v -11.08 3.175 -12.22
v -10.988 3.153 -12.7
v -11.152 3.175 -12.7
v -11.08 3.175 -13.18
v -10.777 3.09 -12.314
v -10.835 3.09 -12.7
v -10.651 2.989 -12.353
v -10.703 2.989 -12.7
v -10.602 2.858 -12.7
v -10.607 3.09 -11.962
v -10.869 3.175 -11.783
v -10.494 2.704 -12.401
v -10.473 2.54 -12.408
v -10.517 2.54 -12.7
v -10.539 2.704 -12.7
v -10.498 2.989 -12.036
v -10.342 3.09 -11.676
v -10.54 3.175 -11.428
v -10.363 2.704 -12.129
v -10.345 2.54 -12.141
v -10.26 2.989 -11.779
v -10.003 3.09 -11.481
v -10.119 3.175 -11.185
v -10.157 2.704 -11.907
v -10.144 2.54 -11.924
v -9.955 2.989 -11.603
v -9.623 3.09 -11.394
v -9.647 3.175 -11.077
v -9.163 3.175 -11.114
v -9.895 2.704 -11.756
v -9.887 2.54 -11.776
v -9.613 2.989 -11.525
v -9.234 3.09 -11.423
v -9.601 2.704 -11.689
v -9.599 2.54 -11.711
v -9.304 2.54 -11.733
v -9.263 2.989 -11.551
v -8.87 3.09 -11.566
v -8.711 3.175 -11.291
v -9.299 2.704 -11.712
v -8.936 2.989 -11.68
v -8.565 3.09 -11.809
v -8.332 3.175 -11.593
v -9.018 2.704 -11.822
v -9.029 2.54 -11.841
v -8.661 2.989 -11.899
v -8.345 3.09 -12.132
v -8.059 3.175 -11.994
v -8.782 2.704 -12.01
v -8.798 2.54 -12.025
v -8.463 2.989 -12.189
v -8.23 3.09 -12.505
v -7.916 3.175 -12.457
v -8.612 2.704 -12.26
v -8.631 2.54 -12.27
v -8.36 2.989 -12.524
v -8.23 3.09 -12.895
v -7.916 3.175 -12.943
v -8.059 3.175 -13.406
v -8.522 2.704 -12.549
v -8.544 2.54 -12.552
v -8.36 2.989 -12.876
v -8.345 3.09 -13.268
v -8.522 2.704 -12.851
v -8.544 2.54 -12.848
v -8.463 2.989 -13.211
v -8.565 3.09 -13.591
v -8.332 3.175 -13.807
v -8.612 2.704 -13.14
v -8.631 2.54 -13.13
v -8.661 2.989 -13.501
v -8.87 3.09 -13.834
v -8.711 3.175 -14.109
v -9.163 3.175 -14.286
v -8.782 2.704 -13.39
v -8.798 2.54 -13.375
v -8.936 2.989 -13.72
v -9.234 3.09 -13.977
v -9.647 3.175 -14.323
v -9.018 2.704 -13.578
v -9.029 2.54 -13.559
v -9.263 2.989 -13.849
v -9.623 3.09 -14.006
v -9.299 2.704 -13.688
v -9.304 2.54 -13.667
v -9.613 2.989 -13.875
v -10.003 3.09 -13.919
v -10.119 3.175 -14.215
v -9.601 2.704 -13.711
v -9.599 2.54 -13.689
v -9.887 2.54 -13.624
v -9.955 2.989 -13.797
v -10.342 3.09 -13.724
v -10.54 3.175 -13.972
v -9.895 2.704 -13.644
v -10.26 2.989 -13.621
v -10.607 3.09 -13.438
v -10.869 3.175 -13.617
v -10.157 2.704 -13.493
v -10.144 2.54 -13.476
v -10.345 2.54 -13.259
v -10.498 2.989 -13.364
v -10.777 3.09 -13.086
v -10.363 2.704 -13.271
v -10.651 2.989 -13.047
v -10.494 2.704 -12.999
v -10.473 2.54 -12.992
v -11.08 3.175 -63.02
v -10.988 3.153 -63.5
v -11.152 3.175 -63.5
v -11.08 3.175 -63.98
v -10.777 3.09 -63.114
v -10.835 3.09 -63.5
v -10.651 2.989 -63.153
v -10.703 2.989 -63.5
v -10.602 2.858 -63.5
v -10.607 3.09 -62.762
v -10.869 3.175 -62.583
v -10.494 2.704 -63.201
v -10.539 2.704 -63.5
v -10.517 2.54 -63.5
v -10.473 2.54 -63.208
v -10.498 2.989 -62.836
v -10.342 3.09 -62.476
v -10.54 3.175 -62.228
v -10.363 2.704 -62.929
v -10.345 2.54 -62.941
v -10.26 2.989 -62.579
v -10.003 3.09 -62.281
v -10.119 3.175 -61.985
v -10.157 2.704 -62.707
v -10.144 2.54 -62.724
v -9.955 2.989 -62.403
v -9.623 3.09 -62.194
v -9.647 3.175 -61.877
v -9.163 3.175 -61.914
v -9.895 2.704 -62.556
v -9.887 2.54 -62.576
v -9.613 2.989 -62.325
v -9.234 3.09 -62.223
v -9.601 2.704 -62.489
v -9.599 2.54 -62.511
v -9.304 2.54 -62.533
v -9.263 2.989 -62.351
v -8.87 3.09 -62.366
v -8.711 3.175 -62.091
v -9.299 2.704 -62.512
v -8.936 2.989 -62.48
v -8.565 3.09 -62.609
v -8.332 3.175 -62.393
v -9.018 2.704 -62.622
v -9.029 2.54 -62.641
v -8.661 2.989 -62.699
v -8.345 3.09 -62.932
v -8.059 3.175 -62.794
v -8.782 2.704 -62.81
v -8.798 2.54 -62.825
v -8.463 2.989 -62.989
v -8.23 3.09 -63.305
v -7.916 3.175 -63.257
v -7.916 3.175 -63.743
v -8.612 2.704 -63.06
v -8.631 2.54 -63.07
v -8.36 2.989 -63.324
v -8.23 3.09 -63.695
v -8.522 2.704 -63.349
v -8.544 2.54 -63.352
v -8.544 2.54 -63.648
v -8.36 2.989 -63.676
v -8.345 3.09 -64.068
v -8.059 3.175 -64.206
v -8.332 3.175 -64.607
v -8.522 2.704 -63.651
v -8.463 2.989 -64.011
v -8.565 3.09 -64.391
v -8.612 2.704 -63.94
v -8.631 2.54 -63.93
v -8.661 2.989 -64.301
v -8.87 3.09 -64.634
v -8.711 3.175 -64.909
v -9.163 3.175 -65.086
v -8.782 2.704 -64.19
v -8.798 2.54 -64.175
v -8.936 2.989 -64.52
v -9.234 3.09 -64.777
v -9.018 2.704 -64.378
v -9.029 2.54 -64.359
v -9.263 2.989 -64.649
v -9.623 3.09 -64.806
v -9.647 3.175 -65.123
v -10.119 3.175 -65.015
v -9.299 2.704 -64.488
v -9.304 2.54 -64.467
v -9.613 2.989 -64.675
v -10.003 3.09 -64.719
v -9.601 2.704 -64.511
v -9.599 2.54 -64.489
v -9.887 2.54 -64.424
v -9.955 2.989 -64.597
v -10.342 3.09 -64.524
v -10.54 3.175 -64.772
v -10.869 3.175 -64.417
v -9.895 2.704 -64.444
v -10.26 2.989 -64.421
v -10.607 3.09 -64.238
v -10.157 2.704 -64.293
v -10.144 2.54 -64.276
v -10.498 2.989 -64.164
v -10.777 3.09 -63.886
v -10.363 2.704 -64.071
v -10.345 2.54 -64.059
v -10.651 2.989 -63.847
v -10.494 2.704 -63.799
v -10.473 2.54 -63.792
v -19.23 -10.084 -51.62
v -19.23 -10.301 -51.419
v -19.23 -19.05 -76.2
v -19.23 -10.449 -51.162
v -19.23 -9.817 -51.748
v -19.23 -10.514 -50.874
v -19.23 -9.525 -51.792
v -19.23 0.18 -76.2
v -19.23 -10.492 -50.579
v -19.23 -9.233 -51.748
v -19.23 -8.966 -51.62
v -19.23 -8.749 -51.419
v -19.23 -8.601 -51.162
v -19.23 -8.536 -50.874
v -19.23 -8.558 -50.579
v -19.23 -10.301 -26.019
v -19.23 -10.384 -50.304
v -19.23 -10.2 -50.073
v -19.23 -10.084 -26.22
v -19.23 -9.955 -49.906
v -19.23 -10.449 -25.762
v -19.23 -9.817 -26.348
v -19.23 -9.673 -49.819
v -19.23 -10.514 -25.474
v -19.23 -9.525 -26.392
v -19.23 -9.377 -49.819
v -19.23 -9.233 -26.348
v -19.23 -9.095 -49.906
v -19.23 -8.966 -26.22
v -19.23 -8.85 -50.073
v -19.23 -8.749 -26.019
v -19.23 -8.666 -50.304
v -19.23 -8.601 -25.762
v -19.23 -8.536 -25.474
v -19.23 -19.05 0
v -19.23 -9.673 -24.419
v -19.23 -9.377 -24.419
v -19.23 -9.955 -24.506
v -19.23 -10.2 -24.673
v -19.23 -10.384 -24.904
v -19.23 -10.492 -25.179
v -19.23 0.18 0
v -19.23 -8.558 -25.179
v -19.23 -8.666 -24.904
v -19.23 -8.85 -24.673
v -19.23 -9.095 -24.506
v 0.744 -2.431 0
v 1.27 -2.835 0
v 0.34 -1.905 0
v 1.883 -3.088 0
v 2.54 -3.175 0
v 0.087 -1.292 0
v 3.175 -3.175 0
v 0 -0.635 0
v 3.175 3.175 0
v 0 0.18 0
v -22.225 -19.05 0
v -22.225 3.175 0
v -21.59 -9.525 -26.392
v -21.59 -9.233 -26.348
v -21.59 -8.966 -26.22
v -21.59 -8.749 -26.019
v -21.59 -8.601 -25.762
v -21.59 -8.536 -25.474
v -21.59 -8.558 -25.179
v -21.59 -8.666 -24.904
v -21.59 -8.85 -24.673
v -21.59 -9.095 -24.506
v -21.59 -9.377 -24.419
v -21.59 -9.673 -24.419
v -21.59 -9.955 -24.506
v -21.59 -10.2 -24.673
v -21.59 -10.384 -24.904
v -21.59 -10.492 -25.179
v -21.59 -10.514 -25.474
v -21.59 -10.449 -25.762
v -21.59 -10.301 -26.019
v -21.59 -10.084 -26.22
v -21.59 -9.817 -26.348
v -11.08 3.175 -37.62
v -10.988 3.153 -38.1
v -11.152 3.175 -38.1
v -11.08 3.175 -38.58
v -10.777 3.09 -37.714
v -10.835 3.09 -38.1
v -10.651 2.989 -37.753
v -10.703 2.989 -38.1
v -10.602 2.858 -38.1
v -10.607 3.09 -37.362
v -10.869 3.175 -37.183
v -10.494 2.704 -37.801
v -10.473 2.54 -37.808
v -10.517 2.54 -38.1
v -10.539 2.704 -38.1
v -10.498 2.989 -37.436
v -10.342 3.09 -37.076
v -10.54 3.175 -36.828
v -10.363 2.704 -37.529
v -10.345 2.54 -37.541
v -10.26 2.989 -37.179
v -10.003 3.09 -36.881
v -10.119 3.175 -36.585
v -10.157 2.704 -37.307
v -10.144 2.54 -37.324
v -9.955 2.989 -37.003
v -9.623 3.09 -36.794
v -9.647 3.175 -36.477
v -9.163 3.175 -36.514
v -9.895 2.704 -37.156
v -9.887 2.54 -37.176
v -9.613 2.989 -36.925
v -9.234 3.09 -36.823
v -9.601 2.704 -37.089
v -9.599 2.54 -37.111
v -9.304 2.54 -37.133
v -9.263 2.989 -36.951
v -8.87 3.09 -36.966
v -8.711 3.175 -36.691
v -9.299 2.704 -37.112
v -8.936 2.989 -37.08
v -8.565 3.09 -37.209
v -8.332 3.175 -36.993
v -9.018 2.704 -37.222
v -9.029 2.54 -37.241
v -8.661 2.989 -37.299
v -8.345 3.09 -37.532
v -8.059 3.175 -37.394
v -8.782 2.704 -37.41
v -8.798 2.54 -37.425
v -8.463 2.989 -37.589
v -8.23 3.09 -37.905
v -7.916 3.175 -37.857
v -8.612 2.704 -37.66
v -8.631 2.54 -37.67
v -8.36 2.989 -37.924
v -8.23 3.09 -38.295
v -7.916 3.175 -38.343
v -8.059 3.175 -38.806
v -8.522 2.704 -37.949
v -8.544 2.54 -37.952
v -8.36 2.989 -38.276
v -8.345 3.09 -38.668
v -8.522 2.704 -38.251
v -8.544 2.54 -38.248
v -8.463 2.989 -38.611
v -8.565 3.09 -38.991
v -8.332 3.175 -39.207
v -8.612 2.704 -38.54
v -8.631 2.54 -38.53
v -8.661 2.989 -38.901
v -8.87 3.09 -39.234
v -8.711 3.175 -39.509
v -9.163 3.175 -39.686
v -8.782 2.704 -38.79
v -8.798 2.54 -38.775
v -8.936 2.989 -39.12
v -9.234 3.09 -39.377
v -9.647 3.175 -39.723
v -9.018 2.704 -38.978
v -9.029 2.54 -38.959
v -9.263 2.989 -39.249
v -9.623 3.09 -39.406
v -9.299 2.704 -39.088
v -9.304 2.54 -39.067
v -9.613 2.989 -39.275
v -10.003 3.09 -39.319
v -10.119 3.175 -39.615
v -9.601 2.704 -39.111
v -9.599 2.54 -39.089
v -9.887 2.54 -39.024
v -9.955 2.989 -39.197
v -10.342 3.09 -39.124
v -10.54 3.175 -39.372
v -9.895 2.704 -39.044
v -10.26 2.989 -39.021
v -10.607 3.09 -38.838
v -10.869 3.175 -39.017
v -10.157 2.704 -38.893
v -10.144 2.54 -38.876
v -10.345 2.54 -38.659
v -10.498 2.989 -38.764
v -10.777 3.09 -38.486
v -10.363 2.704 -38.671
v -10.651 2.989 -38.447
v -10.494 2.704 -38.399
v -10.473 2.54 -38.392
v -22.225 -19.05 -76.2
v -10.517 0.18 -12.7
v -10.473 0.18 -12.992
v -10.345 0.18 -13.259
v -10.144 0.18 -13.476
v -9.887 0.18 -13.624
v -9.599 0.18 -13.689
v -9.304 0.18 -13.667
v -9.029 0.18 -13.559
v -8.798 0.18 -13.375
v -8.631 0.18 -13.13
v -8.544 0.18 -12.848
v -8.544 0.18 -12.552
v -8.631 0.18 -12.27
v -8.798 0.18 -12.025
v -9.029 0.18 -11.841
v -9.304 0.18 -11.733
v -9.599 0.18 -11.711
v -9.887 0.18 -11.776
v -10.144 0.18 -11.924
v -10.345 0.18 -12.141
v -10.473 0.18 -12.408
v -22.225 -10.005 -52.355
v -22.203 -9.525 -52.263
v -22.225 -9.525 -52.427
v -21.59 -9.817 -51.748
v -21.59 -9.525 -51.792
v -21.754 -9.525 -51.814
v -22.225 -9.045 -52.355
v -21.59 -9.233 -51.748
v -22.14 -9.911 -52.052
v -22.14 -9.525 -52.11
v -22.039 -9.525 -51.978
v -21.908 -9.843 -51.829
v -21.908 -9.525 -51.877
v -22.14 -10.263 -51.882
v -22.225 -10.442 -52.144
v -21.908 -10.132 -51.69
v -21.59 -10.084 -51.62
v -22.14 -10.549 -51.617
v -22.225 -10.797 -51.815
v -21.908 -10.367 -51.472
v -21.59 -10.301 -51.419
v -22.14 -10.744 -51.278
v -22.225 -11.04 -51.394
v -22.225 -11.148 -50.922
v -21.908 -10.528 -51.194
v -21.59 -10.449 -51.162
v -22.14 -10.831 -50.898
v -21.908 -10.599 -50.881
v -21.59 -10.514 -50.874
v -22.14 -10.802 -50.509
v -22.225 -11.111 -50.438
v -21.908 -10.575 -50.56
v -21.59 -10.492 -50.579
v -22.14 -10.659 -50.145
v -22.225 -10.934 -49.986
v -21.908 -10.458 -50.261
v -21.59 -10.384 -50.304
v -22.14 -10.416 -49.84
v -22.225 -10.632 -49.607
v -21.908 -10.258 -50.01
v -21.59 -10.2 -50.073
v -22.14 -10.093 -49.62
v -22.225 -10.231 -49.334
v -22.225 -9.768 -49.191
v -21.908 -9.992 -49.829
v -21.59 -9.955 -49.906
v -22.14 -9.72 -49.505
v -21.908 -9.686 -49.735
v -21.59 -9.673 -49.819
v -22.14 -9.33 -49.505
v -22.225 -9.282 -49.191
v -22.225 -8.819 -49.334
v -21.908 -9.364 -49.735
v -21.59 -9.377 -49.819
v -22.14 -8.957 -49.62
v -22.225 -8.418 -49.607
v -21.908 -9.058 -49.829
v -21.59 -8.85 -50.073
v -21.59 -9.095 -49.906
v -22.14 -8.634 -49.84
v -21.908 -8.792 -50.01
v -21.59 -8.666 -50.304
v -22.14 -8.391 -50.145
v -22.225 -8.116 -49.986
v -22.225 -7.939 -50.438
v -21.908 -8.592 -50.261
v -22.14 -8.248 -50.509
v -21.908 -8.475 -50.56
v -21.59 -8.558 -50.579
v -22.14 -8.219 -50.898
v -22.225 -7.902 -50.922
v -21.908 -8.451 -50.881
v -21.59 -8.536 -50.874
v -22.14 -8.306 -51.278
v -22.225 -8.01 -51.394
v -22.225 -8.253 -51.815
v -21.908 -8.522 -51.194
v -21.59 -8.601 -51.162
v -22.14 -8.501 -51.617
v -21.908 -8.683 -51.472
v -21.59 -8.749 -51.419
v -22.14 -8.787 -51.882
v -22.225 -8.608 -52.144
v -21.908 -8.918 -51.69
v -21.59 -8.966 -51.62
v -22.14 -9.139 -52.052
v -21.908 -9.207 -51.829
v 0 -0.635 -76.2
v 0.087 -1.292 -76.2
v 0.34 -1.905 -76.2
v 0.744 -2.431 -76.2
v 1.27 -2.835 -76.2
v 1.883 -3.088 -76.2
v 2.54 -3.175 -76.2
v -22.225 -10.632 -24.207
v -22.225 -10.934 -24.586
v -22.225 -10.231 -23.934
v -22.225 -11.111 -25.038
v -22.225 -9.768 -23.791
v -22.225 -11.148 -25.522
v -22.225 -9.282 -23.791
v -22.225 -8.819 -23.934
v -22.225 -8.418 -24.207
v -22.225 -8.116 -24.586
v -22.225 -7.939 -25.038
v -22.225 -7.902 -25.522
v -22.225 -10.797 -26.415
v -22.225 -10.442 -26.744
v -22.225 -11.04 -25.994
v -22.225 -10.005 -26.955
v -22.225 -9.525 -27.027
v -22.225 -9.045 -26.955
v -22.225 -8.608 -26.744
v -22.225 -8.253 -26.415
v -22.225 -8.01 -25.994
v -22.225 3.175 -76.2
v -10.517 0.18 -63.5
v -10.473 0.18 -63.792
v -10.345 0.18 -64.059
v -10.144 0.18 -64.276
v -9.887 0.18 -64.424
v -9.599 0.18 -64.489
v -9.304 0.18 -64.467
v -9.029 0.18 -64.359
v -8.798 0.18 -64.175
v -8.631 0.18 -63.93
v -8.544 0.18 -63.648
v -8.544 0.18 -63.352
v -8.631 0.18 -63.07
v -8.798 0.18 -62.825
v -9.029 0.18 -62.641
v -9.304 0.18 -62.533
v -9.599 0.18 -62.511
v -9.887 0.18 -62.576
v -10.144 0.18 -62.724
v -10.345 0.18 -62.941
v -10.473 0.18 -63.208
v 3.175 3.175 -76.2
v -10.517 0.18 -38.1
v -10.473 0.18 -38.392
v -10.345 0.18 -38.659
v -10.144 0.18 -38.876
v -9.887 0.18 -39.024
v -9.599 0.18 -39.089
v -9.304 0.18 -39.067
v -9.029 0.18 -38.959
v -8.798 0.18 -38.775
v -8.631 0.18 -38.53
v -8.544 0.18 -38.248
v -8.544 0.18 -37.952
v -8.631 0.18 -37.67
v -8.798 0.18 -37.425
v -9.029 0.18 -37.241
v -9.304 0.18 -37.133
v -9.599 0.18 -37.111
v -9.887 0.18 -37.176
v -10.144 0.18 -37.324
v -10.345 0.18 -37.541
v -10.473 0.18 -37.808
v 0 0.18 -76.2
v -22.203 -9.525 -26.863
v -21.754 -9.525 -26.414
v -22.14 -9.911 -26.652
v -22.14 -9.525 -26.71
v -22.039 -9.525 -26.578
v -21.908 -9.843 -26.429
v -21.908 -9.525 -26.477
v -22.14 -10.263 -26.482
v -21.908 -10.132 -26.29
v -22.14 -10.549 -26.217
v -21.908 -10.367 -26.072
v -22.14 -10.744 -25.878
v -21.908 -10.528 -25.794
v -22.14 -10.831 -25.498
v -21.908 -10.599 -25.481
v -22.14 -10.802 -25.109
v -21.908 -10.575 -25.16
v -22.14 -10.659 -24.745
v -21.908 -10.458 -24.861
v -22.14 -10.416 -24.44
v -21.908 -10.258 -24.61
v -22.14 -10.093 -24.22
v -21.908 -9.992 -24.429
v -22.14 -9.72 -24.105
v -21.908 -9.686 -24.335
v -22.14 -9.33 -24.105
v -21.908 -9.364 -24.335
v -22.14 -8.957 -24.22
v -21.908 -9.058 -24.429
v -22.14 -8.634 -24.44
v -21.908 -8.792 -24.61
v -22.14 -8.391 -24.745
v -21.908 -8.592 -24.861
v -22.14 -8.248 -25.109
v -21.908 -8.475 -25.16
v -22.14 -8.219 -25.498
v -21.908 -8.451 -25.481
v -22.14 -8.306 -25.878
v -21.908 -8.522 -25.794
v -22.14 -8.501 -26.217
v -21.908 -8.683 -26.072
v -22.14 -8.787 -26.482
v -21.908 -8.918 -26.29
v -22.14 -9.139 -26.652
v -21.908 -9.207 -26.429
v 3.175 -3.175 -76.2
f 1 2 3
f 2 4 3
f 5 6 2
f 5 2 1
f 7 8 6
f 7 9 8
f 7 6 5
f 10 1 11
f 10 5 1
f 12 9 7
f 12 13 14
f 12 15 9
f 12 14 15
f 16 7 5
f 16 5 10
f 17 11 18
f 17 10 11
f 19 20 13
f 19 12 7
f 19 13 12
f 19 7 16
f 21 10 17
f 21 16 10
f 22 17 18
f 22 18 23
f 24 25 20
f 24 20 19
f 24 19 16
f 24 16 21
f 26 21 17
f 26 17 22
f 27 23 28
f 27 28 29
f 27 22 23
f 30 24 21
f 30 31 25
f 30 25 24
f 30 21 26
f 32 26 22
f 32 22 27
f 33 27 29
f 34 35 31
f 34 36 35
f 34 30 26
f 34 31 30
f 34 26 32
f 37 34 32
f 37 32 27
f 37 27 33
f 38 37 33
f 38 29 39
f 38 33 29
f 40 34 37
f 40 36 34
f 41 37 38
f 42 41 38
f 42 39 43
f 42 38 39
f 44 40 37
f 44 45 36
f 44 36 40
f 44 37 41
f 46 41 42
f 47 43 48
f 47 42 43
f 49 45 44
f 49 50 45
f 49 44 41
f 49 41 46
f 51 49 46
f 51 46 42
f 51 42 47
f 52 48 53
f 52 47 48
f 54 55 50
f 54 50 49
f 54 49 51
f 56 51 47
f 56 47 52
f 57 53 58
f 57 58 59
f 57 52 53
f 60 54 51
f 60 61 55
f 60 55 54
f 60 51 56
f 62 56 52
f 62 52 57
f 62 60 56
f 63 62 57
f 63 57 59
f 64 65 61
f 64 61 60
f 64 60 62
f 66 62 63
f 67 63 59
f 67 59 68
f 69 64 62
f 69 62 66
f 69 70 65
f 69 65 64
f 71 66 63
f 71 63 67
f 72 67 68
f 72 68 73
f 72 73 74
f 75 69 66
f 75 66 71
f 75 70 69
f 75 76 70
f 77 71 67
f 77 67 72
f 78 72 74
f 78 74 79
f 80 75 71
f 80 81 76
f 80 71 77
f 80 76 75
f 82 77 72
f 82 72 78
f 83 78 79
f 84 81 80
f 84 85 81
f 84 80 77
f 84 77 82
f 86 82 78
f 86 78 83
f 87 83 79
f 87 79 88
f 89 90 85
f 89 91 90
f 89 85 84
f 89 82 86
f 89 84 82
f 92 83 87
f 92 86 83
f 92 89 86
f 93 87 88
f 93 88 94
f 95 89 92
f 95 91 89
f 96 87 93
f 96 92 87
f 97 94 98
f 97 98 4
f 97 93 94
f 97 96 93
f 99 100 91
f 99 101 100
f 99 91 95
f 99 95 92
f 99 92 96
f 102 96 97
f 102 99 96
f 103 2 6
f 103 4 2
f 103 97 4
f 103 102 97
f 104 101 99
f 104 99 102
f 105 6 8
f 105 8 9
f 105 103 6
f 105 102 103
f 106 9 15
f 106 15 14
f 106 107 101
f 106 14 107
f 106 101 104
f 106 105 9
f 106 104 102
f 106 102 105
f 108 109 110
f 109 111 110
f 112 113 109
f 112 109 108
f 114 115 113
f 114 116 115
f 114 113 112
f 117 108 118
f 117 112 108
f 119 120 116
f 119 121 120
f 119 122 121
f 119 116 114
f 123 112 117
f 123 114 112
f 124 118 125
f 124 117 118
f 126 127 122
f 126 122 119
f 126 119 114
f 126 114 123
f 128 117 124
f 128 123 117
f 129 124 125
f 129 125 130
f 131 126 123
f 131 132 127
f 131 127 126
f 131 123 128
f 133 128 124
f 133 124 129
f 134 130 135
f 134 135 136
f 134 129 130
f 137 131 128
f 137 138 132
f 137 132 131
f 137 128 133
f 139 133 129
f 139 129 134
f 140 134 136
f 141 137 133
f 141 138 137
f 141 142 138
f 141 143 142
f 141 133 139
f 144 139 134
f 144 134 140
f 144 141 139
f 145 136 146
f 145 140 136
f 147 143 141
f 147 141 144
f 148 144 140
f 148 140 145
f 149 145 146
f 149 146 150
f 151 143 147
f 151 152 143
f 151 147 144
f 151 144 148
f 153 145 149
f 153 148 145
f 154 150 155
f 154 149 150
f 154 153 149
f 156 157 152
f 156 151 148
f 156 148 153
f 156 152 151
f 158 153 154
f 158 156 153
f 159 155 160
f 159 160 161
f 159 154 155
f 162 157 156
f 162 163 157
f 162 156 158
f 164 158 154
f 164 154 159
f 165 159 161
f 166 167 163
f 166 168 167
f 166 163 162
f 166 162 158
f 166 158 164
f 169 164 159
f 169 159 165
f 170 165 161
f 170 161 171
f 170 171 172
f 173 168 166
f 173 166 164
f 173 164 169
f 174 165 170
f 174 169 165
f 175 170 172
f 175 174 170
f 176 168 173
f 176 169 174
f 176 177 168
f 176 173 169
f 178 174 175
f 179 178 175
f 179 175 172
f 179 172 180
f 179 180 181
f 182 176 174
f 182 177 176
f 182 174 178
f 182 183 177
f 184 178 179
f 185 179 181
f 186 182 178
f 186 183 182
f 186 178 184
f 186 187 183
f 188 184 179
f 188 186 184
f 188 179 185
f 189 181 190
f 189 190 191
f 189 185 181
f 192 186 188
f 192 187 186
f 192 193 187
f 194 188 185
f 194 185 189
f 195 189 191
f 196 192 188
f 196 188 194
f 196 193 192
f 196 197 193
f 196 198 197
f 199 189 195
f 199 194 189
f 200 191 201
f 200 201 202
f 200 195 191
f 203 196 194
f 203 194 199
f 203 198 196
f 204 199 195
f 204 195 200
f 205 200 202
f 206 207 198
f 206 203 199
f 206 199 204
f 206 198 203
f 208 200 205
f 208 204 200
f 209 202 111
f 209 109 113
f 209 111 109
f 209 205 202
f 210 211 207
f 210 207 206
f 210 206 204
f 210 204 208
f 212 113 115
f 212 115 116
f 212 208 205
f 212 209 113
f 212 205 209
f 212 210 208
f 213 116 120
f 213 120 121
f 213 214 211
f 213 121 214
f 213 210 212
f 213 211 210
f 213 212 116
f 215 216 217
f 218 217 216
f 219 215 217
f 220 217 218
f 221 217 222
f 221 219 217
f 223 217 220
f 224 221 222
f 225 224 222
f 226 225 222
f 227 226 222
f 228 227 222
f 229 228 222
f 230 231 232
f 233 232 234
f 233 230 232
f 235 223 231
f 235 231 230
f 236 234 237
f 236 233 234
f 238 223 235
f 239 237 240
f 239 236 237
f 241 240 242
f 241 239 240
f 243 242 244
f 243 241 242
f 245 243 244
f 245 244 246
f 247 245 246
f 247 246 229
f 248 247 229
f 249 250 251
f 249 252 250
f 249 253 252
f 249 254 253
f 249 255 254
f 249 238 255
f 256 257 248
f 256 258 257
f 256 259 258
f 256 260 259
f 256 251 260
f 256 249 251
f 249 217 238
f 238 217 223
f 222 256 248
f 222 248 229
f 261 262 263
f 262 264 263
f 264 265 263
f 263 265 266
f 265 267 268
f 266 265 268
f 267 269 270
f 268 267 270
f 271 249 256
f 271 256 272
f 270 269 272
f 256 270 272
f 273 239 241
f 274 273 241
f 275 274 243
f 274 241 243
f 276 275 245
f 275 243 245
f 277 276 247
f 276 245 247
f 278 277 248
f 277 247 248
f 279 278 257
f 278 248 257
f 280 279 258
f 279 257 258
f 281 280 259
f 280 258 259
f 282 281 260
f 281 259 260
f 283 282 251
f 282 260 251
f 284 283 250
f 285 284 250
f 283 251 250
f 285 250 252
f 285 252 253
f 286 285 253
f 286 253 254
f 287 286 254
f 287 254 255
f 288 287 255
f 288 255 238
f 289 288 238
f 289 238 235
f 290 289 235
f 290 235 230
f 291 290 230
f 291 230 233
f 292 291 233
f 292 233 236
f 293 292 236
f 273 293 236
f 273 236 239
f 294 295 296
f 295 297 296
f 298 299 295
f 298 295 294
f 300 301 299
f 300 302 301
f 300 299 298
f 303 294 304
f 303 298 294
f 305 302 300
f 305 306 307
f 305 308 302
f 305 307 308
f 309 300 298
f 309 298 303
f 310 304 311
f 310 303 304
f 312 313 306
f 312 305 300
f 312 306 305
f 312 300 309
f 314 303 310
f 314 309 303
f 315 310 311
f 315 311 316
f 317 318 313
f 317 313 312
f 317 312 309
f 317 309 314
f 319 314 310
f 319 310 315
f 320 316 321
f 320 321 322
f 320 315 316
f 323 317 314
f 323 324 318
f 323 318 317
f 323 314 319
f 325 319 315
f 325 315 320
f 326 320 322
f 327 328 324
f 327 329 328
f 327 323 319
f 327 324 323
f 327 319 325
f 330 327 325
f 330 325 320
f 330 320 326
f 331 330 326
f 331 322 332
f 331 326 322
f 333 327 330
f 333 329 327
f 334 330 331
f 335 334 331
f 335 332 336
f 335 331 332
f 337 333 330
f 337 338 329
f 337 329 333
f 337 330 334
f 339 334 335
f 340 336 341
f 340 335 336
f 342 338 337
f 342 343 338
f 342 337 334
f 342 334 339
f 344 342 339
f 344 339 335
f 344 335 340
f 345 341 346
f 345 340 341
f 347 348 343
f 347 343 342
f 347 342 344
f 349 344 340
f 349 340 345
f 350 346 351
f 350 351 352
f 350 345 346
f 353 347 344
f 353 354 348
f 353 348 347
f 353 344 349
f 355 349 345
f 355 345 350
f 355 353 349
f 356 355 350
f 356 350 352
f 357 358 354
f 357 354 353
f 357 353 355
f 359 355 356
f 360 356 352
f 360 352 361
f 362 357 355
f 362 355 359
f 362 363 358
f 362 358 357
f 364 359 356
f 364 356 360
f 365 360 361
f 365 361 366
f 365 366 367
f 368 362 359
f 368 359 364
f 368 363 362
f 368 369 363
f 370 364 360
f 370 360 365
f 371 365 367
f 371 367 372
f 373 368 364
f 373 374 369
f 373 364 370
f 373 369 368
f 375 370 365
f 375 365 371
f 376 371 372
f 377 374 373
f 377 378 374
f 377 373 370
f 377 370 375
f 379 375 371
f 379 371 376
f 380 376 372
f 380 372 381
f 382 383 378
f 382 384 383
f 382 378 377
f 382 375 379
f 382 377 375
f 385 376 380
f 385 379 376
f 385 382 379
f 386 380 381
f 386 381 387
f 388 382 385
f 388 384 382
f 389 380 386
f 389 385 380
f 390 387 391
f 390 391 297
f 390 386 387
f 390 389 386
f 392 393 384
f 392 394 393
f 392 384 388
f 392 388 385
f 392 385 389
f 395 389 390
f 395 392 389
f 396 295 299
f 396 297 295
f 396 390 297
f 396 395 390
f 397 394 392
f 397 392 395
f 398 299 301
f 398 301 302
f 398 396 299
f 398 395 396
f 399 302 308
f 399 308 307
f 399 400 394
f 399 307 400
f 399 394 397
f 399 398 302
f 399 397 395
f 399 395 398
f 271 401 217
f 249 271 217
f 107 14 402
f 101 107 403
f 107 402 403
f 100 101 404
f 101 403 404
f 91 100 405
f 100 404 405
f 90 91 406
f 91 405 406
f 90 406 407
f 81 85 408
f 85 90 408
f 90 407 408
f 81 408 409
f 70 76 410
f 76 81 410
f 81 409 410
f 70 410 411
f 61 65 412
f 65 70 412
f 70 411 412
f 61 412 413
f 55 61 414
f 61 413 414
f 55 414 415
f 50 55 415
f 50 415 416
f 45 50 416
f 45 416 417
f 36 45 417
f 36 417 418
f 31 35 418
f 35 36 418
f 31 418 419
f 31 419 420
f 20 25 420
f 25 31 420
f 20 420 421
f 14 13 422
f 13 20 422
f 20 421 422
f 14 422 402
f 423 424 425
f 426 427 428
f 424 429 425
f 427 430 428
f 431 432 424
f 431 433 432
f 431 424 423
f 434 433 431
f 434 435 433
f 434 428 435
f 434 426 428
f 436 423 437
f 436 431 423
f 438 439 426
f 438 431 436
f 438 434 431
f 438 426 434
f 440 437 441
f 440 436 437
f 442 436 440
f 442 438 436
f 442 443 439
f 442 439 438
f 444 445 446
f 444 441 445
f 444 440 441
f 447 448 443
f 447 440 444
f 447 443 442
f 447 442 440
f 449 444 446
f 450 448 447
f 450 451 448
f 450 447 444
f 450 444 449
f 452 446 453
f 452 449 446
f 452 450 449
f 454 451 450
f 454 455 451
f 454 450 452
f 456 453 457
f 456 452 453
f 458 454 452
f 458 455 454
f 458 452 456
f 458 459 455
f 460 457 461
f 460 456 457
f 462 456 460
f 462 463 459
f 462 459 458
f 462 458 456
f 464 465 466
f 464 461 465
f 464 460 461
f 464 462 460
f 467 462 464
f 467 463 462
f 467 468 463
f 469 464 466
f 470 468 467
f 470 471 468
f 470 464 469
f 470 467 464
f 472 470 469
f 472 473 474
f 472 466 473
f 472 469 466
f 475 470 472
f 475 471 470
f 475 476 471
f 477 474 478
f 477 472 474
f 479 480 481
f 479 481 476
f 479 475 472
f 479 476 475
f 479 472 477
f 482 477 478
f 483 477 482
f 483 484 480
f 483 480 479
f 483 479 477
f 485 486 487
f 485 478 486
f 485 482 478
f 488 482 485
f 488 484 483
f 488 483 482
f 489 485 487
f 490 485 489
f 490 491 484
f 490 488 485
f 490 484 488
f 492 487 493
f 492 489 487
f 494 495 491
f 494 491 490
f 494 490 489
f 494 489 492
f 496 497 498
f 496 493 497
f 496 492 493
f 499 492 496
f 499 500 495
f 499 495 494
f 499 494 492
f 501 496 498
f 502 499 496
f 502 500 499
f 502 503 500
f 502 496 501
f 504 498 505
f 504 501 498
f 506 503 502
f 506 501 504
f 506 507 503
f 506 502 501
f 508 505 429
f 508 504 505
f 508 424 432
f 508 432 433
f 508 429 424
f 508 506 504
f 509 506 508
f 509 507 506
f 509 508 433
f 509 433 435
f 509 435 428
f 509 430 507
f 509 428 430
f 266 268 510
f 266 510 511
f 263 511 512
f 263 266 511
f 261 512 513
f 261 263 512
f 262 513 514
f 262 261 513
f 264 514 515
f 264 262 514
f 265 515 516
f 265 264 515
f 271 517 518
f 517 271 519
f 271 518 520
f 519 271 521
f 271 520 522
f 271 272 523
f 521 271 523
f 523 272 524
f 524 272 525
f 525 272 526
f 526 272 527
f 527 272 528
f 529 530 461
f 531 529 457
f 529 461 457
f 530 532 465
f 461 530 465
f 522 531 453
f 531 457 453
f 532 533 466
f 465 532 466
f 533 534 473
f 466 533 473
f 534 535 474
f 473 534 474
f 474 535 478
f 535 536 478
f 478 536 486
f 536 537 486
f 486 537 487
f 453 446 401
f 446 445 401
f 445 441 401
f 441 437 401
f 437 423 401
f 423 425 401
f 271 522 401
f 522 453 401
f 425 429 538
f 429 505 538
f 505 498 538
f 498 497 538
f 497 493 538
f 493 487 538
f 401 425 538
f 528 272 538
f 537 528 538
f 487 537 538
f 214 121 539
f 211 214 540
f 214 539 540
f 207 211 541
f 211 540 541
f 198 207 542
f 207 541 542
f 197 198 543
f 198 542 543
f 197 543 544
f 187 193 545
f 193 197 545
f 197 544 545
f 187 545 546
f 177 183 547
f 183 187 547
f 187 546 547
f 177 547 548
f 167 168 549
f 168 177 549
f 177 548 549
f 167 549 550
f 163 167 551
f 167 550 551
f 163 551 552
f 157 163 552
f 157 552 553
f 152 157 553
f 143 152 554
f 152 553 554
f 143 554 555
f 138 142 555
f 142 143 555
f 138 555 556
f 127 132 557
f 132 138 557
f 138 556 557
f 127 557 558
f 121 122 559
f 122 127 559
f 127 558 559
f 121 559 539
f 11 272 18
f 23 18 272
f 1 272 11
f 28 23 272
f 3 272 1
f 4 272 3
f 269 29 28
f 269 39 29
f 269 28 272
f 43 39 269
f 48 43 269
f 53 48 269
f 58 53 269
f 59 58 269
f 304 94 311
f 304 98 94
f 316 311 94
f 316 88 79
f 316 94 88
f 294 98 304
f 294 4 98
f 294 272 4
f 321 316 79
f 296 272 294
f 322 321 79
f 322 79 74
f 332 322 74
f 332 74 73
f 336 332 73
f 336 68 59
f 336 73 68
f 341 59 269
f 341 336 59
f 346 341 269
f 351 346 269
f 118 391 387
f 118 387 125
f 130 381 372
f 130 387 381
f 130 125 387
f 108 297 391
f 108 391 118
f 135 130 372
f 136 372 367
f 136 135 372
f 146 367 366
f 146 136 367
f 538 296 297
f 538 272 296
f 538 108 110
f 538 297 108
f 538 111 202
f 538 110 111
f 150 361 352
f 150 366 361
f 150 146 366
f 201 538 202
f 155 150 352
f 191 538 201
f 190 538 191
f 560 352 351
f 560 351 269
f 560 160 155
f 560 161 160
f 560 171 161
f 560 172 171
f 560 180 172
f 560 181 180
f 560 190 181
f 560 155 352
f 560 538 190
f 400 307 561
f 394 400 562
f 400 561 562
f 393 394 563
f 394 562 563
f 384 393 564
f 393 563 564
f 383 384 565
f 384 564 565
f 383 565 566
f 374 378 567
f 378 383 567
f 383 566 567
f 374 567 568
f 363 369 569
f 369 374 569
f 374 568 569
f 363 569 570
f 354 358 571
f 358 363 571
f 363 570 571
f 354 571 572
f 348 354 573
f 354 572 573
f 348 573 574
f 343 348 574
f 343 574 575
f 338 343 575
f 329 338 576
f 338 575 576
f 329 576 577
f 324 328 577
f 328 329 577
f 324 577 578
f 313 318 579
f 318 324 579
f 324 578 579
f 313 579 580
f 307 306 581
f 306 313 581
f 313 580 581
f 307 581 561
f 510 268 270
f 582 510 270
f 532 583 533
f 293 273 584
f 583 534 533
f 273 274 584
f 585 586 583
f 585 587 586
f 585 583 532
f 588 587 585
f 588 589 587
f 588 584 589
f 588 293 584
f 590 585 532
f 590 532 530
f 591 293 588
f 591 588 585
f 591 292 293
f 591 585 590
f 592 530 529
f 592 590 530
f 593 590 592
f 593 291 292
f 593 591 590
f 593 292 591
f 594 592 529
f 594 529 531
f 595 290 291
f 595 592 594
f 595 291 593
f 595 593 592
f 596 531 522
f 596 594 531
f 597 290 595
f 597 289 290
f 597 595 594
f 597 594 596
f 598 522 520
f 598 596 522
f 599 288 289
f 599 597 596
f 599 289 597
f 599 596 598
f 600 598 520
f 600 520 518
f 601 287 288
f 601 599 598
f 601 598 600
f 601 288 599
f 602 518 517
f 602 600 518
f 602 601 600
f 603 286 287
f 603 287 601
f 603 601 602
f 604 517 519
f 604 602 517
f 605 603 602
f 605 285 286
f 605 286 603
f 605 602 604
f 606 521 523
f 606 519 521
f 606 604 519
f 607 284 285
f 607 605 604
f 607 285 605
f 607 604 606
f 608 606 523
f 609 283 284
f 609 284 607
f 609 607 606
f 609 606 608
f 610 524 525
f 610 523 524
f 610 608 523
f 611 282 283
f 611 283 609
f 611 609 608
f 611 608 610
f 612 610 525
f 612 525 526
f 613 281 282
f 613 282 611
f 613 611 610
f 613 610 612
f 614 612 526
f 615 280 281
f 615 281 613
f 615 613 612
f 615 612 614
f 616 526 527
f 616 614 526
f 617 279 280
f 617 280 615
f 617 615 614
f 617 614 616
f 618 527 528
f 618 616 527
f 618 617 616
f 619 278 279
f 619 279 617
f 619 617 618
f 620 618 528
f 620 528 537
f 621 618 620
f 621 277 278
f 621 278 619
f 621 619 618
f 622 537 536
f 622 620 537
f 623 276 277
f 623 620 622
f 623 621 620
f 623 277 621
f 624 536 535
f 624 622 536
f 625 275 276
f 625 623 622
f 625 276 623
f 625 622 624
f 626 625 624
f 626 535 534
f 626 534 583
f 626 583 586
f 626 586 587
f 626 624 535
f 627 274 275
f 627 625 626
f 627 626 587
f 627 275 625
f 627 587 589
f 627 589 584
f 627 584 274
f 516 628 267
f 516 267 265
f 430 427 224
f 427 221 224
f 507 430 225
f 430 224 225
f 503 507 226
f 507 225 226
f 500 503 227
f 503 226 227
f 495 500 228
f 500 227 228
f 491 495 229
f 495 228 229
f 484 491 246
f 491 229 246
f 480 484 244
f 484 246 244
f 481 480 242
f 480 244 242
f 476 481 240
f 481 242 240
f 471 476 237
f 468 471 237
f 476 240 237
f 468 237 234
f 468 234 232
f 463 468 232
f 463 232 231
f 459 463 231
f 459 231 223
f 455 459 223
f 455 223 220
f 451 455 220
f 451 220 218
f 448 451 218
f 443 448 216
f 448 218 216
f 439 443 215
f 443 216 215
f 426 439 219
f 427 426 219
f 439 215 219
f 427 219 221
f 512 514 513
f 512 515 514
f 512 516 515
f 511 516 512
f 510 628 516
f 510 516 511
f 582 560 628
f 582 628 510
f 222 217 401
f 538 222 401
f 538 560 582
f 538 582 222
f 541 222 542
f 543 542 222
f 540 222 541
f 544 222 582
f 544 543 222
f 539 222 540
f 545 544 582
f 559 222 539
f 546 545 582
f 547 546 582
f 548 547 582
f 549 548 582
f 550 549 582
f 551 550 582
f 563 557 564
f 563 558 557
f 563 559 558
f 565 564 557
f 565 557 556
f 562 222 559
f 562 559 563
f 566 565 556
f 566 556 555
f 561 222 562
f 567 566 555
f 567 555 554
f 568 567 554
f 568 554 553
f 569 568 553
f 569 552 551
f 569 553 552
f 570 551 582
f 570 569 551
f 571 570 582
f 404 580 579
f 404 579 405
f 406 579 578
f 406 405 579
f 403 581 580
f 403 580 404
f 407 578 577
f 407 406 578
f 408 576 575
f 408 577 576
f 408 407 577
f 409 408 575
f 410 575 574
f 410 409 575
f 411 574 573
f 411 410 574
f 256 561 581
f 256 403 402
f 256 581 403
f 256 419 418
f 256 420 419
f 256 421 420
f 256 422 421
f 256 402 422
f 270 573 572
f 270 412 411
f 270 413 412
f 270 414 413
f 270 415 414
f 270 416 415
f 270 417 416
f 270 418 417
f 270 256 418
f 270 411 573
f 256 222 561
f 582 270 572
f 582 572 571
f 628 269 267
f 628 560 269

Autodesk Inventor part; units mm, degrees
ref_plane "YZ Plane" through (0, 0, 0) normal (1, 0, 0) x (0, 1, 0)
ref_plane "XZ Plane" through (0, 0, 0) normal (0, 1, 0) x (-1, 0, 0)
ref_plane "XY Plane" through (0, 0, 0) normal (0, 0, 1) x (1, 0, 0)
sketch "Sketch9" plane through (0, 0, 0) normal (0, 1, 0) x (-1, 0, 0)
  line L0 (0, 0) -> (19.05, 0)
  line L1 (19.05, 0) -> (19.05, -76.2)
  line L2 (19.05, -76.2) -> (0, -76.2)
  line L3 (0, -76.2) -> (0, 0)
  circle A0 centre (9.525, -38.1) radius 0.9922
  circle A1 centre (9.525, -12.7) radius 0.9922
  circle A2 centre (9.525, -63.5) radius 0.9922
  dimension "d41" = 76.2
  dimension "d42" = 19.05
  dimension "d43" = 1.9844
  dimension "d44" = 9.525
  dimension "d45" = 38.1
  dimension "d46" = 1.9844
  dimension "d47" = 1.9844
  dimension "d48" = 9.525
  dimension "d49" = 9.525
  dimension "d50" = 25.4
  dimension "d51" = 25.4
extrude "Extrusion7" add sketch "Sketch9" along normal blind 3.175
sketch "Sketch10" plane through (0, 3.175, 0) normal (0, 1, 0) x (1, 0, 0)
  line L0 (-19.05, 76.2) -> (-19.05, 0) projected
  line L1 (-19.05, 0) -> (-22.225, 0)
  line L2 (-22.225, 0) -> (-22.225, 76.2)
  line L3 (-22.225, 76.2) -> (-19.05, 76.2)
  line L4 (-19.05, 76.2) -> (-19.05, 0)
  point P0 (0, 0)
  dimension "d54" = 3.175
  dimension "d55" = 76.2
extrude "Extrusion8" add sketch "Sketch10" against normal blind 22.225
sketch "Sketch11" plane through (-19.05, 0, 0) normal (1, 0, 0) x (0, 0, -1)
  circle A0 centre (25.4, -9.525) radius 0.9922
  circle A1 centre (50.8, -9.525) radius 0.9922
  line L0 (76.2, -19.05) -> (0, -19.05) projected
  line L1 (0, 0) -> (0, -19.05) projected
  dimension "d58" = 1.9844
  dimension "d59" = 1.9844
  dimension "d60" = 9.525
  dimension "d61" = 9.525
  dimension "d62" = 25.4
  dimension "d63" = 25.4
extrude "Extrusion9" cut sketch "Sketch11" against normal blind 22.225
sketch "Sketch12" plane through (0, 0, 0) normal (0, 0, 1) x (1, 0, 0)
  line L0 (-19.05, 0) -> (-19.05, -19.05) projected
  line L1 (-19.05, 0) -> (-19.2296, 0.1796)
  line L2 (-19.05, 0) -> (0, 0) projected
  line L3 (-19.2296, 0.1796) -> (0, 0.1796)
  line L4 (0, 0.1796) -> (0, -19.05)
  line L5 (0, -19.05) -> (-19.2296, -19.05)
  line L6 (-19.2296, -19.05) -> (-19.2296, 0.1796)
  point P0 (0, 0)
  dimension "d68" = 0.254
  dimension "d69" = 135
extrude "Extrusion10" cut sketch "Sketch12" against normal blind 76.2
fillet "Fillet4" radius 0.635 5 edges at (-22.225, -9.525, -24.4078) (-22.225, -9.525, -49.8078) (-8.5328, 3.175, -63.5) (-8.5328, 3.175, -38.1) (-8.5328, 3.175, -12.7)
sketch "Sketch13" plane through (0, 3.175, -76.2) normal (0, 0, -1) x (-1, 0, 0)
  line L0 (22.225, 0) -> (0, 0) projected
  line L1 (0, 0) -> (-3.175, 0)
  line L2 (-3.175, 0) -> (-3.175, -6.35)
  line L3 (-3.175, -6.35) -> (0, -6.35)
  line L4 (0, -6.35) -> (0, 0)
  point P0 (0, -3.175)
  dimension "d73" = 3.175
  dimension "d74" = 6.35
extrude "Extrusion11" add sketch "Sketch13" against normal blind 76.2
fillet "Fillet5" radius 2.54 1 edges at (0, -3.175, -38.1)
properties part number "Block Bracket Mark Guide Tool"
